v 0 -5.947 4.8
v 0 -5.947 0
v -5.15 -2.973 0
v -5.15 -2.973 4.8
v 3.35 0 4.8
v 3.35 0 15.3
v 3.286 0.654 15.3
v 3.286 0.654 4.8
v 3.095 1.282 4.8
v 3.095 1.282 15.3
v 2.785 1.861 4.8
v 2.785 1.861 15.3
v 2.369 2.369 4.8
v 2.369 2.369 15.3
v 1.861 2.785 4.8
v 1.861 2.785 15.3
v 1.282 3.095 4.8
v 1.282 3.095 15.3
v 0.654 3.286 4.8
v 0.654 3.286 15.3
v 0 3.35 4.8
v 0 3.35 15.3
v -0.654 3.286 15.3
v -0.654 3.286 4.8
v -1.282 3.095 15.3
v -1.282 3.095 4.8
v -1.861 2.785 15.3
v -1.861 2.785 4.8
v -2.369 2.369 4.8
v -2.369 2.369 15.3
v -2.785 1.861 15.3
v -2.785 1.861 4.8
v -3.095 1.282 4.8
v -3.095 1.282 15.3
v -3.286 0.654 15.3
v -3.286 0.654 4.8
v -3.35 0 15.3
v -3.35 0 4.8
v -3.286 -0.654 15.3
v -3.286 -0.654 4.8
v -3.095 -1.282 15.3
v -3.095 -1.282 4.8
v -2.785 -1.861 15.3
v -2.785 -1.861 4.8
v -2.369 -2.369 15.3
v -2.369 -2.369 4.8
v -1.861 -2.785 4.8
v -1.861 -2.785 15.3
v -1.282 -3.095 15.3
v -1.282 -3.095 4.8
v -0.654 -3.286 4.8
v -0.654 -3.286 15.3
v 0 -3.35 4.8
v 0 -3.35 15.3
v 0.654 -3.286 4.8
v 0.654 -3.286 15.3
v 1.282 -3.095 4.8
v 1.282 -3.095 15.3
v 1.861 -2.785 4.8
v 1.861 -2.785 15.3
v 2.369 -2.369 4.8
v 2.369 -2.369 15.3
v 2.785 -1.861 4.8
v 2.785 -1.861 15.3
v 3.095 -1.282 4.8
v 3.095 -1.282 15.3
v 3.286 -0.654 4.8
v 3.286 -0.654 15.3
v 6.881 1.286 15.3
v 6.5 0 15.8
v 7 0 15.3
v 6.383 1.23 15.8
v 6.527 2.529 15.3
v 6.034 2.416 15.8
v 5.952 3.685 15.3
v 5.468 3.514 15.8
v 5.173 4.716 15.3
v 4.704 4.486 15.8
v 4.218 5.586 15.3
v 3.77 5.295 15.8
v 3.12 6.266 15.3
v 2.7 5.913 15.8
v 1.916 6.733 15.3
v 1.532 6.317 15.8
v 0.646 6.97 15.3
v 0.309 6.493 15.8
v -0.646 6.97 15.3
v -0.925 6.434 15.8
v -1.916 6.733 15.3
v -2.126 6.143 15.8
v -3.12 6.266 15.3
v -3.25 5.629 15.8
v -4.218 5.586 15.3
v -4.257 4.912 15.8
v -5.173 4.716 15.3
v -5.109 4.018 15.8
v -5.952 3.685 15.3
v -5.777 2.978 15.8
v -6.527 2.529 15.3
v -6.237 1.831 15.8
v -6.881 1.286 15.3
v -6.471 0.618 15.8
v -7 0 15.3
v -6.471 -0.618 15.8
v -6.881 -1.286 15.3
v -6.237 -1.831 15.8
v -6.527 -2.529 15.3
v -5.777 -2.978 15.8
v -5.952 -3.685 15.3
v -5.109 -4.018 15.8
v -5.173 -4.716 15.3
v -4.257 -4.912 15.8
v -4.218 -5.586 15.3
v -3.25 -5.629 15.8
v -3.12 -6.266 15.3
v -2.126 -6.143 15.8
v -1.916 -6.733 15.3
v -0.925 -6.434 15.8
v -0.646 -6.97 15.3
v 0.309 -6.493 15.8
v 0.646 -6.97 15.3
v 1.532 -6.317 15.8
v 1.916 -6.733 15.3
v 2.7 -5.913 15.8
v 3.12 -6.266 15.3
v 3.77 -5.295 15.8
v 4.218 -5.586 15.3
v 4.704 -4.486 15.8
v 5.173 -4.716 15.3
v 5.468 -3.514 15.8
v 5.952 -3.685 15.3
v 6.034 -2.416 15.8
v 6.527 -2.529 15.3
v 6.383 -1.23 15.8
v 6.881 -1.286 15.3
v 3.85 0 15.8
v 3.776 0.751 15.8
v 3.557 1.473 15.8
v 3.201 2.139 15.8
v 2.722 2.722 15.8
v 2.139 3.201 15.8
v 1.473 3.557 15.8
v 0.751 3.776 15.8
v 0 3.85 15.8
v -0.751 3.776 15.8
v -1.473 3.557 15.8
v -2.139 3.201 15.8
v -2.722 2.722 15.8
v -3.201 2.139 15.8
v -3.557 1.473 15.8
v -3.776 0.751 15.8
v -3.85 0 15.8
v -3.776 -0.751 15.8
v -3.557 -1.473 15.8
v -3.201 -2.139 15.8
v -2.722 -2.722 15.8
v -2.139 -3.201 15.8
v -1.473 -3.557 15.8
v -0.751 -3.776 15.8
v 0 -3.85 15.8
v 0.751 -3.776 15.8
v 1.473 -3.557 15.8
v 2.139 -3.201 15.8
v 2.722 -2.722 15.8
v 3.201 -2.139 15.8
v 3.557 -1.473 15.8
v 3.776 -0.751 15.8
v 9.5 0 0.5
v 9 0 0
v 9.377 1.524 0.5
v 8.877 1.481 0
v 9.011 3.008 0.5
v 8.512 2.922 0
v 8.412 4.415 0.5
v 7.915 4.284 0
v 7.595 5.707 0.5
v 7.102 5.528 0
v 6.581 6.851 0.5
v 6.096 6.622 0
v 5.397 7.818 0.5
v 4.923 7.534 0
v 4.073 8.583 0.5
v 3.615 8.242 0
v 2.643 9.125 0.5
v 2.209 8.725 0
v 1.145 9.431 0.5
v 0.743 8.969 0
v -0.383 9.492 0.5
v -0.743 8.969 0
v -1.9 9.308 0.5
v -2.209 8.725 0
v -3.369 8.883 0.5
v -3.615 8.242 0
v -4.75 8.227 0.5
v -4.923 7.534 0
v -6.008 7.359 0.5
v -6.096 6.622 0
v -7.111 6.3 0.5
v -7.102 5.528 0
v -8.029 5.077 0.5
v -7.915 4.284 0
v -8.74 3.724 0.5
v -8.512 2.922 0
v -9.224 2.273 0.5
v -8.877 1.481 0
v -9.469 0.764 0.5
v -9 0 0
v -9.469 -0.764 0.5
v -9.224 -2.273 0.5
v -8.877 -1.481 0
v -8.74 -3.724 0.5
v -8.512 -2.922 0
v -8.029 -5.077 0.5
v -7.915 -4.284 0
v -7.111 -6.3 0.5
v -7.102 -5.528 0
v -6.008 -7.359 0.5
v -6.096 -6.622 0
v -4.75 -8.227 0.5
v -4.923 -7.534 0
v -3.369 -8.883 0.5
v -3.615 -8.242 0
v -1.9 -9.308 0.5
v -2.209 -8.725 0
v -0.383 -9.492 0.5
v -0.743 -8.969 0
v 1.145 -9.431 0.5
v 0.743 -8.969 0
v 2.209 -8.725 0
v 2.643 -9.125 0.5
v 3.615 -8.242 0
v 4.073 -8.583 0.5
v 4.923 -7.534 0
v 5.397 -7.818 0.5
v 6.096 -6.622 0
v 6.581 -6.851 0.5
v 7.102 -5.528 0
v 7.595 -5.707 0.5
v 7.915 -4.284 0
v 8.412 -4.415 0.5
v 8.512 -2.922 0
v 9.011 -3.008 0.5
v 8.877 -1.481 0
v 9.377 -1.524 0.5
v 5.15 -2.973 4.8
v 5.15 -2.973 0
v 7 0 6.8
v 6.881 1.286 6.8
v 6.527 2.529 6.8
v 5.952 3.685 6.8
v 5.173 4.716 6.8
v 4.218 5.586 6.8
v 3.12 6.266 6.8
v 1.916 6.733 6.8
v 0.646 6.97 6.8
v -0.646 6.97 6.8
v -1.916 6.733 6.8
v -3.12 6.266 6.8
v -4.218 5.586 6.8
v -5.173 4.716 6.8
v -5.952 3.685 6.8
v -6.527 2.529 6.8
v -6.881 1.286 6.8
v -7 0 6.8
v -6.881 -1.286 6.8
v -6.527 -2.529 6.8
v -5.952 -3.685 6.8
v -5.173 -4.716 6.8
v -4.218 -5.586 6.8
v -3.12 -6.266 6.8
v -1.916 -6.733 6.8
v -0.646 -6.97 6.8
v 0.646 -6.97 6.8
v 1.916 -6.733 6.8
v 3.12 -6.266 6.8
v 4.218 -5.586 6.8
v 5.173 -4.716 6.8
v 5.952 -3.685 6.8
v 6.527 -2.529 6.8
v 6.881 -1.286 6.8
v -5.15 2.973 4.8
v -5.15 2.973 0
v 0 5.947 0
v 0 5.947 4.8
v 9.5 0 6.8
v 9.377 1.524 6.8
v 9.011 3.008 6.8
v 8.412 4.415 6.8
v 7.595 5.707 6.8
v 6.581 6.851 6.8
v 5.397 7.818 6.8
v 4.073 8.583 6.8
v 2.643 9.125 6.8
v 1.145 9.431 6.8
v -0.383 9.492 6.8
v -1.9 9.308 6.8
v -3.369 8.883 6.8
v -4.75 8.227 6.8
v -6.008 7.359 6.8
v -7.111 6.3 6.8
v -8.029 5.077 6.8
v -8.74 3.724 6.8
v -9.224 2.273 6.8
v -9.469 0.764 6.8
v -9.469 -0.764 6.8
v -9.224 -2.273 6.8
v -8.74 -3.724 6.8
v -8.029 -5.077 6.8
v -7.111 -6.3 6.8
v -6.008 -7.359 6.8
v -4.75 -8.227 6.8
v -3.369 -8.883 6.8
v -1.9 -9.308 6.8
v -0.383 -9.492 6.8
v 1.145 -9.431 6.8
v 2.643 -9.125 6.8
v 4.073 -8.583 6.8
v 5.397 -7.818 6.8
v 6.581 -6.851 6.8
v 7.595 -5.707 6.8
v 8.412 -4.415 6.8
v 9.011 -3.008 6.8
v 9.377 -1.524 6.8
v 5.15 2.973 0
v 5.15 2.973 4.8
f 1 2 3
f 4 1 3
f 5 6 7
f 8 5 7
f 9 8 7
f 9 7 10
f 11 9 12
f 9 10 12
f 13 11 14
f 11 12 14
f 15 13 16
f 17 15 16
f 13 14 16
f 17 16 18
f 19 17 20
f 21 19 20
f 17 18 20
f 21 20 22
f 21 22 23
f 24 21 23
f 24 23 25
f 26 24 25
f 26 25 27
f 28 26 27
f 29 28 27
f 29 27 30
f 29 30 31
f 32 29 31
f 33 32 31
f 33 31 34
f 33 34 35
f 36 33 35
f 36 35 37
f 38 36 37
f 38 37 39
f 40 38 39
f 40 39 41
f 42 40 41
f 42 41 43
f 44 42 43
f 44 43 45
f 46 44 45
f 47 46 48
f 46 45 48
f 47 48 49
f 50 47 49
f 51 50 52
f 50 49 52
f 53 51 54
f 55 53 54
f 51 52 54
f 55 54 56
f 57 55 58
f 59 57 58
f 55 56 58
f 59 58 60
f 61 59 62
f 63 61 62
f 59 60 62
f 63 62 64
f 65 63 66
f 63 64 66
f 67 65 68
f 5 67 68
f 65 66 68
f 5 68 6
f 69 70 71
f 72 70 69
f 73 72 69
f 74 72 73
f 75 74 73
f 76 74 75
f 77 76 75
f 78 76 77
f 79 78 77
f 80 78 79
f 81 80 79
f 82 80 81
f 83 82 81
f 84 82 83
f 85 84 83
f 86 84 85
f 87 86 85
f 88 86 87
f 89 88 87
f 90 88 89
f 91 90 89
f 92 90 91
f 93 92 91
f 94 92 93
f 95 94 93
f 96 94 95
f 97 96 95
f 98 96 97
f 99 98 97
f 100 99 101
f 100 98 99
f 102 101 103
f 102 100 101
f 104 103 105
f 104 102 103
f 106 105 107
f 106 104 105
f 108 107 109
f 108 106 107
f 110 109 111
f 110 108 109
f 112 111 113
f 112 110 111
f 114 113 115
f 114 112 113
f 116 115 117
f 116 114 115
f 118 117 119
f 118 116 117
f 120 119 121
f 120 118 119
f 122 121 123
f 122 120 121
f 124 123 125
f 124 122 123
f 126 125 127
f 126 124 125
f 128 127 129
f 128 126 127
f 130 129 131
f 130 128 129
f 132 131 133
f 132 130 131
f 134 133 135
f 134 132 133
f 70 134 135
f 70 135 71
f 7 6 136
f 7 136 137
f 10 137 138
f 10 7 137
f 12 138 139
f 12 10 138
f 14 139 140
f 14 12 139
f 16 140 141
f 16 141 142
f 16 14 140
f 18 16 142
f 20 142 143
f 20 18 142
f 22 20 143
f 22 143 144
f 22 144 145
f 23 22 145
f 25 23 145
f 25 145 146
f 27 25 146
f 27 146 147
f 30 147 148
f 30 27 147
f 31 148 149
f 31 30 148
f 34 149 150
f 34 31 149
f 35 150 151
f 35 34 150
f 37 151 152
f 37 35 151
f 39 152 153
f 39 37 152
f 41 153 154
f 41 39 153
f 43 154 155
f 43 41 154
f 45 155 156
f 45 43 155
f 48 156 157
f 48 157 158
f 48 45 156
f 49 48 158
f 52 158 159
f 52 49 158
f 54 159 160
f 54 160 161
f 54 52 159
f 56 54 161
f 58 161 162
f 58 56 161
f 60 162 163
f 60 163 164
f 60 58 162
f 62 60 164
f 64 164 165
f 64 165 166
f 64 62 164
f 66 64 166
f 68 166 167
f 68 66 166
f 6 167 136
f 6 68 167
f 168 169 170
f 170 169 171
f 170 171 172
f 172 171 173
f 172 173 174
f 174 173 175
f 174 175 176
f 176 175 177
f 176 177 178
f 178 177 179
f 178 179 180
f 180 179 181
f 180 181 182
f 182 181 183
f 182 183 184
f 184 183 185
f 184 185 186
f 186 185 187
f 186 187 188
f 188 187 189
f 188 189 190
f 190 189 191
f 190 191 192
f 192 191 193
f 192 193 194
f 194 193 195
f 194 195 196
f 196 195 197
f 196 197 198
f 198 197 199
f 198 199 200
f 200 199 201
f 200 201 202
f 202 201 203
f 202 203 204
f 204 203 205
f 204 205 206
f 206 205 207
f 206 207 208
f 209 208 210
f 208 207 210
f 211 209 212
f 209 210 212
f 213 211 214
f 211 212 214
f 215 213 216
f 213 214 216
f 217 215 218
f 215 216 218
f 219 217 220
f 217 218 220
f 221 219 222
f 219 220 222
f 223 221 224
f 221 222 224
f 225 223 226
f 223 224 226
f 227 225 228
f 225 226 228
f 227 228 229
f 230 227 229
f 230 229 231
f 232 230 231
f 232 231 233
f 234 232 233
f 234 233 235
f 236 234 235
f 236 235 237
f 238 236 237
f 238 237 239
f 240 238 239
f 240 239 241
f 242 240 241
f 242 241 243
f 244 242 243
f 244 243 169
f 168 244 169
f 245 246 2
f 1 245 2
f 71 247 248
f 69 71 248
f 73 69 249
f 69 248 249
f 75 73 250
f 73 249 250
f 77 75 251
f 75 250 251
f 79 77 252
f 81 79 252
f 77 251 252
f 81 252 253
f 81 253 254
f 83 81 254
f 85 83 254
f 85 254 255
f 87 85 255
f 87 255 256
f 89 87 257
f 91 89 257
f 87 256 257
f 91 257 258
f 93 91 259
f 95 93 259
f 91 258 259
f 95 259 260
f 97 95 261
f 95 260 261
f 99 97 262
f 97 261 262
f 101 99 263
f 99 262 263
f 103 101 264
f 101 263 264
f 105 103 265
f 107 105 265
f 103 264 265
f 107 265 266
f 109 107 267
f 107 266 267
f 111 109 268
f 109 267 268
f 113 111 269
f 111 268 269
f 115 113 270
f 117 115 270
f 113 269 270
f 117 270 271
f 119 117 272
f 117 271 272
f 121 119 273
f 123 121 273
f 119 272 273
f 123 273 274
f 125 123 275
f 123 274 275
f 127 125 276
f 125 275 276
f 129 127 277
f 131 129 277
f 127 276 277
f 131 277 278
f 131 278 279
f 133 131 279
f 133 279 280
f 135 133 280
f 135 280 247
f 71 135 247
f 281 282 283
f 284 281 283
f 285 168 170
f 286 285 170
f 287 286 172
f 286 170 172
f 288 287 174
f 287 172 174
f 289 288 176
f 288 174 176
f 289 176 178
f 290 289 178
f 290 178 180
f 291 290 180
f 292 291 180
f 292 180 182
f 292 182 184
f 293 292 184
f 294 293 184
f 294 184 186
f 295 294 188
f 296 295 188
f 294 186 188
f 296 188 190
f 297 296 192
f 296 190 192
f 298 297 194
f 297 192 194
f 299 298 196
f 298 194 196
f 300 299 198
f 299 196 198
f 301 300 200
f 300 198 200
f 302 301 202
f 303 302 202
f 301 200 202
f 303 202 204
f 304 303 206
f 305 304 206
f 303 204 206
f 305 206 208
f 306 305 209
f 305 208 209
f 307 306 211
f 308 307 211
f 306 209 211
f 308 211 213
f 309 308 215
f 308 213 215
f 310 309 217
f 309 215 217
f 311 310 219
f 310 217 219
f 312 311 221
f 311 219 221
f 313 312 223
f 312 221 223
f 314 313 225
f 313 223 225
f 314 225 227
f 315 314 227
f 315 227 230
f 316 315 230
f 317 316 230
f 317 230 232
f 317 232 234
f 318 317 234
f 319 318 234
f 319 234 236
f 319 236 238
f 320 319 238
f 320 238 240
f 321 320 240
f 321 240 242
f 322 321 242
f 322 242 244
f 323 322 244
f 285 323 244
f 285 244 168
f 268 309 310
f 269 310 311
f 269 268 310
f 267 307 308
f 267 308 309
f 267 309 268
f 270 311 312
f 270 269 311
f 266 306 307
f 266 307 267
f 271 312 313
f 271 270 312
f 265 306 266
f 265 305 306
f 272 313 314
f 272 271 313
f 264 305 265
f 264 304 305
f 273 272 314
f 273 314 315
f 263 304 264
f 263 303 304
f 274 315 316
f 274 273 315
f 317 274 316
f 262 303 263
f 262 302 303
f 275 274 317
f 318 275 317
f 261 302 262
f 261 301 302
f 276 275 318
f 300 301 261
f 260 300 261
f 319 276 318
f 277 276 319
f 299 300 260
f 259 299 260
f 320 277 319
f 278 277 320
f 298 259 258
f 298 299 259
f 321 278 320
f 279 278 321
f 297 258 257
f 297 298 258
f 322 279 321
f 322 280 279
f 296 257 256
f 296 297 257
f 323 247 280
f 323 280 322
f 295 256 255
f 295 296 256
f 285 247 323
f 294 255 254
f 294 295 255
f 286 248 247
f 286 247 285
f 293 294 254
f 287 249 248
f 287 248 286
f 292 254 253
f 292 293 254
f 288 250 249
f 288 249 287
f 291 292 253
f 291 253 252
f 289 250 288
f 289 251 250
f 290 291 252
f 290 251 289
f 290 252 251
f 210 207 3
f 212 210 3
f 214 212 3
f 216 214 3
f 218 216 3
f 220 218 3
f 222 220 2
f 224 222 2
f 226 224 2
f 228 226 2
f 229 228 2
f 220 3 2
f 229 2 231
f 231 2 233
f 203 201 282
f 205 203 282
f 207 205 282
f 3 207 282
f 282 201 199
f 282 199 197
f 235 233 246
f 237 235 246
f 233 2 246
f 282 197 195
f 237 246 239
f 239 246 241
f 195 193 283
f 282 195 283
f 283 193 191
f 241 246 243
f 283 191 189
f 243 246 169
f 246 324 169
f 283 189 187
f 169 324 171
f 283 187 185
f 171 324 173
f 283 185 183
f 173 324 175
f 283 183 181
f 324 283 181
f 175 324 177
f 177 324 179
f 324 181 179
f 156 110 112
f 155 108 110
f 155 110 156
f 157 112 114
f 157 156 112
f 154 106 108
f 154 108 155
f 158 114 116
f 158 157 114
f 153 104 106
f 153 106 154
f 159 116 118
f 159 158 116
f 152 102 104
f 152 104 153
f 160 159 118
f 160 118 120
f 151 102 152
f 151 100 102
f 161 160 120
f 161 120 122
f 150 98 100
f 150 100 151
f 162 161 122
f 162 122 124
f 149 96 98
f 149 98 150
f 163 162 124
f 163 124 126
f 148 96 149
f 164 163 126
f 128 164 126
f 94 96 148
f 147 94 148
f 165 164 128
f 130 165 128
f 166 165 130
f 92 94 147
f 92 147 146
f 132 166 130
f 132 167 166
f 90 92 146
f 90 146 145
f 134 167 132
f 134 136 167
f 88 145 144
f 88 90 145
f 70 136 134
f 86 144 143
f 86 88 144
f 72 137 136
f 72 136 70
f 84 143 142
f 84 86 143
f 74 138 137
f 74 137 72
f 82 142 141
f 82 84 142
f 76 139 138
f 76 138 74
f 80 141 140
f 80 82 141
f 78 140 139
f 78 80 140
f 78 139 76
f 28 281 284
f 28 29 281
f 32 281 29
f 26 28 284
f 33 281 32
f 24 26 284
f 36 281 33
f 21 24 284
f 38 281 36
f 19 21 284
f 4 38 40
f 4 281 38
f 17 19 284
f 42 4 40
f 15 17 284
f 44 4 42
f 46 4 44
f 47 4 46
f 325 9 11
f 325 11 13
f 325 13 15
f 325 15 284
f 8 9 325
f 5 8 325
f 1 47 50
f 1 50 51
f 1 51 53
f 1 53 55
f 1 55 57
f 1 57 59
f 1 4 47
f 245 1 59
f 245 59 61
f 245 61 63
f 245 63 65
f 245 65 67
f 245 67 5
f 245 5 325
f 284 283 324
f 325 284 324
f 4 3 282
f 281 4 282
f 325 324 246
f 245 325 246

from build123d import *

# Parameters (mm, degrees)
F0_R     = 9.5
F1_DEPTH = 6.8
F2_R     = 7
F3_DEPTH = 9
F5_DEPTH = 4.8
F6_R     = 3.35
F7_DEPTH = 15.801
F8_SIZE  = 0.5


with BuildPart() as f1:
    # F0 (on Top) → F1 (new body)
    with BuildSketch(Plane.XY):
        Circle(F0_R)
    extrude(amount=F1_DEPTH)

    # F2 (on face) → F3 (join)
    with BuildSketch(Plane.XY.offset(6.8)):
        Circle(F2_R)
    extrude(amount=F3_DEPTH)

    # F4 (on face) → F5 (cut)
    with BuildSketch(Plane(origin=(0, 0, 0), x_dir=(1, 0, 0), z_dir=(0, 0, -1))):
        Polygon((-5.15, -2.973354), (0, -5.946708), (5.15, -2.973354), (5.15, 2.973354), (0, 5.946708), (-5.15, 2.973354), align=None)
    extrude(amount=-F5_DEPTH, mode=Mode.SUBTRACT)

    # F6 (on face) → F7 (cut, through all)
    with BuildSketch(Plane.XY.offset(15.8)):
        Circle(F6_R)
    extrude(amount=-F7_DEPTH, mode=Mode.SUBTRACT)

    # F8
    f8_edges = [f1.edges().sort_by_distance(p)[0] for p in [
        (-7, 0, 15.8),
        (-3.35, 0, 15.8),
        (-9.5, 0, 0),
    ]]
    chamfer(f8_edges, length=F8_SIZE)


solid = f1.part
